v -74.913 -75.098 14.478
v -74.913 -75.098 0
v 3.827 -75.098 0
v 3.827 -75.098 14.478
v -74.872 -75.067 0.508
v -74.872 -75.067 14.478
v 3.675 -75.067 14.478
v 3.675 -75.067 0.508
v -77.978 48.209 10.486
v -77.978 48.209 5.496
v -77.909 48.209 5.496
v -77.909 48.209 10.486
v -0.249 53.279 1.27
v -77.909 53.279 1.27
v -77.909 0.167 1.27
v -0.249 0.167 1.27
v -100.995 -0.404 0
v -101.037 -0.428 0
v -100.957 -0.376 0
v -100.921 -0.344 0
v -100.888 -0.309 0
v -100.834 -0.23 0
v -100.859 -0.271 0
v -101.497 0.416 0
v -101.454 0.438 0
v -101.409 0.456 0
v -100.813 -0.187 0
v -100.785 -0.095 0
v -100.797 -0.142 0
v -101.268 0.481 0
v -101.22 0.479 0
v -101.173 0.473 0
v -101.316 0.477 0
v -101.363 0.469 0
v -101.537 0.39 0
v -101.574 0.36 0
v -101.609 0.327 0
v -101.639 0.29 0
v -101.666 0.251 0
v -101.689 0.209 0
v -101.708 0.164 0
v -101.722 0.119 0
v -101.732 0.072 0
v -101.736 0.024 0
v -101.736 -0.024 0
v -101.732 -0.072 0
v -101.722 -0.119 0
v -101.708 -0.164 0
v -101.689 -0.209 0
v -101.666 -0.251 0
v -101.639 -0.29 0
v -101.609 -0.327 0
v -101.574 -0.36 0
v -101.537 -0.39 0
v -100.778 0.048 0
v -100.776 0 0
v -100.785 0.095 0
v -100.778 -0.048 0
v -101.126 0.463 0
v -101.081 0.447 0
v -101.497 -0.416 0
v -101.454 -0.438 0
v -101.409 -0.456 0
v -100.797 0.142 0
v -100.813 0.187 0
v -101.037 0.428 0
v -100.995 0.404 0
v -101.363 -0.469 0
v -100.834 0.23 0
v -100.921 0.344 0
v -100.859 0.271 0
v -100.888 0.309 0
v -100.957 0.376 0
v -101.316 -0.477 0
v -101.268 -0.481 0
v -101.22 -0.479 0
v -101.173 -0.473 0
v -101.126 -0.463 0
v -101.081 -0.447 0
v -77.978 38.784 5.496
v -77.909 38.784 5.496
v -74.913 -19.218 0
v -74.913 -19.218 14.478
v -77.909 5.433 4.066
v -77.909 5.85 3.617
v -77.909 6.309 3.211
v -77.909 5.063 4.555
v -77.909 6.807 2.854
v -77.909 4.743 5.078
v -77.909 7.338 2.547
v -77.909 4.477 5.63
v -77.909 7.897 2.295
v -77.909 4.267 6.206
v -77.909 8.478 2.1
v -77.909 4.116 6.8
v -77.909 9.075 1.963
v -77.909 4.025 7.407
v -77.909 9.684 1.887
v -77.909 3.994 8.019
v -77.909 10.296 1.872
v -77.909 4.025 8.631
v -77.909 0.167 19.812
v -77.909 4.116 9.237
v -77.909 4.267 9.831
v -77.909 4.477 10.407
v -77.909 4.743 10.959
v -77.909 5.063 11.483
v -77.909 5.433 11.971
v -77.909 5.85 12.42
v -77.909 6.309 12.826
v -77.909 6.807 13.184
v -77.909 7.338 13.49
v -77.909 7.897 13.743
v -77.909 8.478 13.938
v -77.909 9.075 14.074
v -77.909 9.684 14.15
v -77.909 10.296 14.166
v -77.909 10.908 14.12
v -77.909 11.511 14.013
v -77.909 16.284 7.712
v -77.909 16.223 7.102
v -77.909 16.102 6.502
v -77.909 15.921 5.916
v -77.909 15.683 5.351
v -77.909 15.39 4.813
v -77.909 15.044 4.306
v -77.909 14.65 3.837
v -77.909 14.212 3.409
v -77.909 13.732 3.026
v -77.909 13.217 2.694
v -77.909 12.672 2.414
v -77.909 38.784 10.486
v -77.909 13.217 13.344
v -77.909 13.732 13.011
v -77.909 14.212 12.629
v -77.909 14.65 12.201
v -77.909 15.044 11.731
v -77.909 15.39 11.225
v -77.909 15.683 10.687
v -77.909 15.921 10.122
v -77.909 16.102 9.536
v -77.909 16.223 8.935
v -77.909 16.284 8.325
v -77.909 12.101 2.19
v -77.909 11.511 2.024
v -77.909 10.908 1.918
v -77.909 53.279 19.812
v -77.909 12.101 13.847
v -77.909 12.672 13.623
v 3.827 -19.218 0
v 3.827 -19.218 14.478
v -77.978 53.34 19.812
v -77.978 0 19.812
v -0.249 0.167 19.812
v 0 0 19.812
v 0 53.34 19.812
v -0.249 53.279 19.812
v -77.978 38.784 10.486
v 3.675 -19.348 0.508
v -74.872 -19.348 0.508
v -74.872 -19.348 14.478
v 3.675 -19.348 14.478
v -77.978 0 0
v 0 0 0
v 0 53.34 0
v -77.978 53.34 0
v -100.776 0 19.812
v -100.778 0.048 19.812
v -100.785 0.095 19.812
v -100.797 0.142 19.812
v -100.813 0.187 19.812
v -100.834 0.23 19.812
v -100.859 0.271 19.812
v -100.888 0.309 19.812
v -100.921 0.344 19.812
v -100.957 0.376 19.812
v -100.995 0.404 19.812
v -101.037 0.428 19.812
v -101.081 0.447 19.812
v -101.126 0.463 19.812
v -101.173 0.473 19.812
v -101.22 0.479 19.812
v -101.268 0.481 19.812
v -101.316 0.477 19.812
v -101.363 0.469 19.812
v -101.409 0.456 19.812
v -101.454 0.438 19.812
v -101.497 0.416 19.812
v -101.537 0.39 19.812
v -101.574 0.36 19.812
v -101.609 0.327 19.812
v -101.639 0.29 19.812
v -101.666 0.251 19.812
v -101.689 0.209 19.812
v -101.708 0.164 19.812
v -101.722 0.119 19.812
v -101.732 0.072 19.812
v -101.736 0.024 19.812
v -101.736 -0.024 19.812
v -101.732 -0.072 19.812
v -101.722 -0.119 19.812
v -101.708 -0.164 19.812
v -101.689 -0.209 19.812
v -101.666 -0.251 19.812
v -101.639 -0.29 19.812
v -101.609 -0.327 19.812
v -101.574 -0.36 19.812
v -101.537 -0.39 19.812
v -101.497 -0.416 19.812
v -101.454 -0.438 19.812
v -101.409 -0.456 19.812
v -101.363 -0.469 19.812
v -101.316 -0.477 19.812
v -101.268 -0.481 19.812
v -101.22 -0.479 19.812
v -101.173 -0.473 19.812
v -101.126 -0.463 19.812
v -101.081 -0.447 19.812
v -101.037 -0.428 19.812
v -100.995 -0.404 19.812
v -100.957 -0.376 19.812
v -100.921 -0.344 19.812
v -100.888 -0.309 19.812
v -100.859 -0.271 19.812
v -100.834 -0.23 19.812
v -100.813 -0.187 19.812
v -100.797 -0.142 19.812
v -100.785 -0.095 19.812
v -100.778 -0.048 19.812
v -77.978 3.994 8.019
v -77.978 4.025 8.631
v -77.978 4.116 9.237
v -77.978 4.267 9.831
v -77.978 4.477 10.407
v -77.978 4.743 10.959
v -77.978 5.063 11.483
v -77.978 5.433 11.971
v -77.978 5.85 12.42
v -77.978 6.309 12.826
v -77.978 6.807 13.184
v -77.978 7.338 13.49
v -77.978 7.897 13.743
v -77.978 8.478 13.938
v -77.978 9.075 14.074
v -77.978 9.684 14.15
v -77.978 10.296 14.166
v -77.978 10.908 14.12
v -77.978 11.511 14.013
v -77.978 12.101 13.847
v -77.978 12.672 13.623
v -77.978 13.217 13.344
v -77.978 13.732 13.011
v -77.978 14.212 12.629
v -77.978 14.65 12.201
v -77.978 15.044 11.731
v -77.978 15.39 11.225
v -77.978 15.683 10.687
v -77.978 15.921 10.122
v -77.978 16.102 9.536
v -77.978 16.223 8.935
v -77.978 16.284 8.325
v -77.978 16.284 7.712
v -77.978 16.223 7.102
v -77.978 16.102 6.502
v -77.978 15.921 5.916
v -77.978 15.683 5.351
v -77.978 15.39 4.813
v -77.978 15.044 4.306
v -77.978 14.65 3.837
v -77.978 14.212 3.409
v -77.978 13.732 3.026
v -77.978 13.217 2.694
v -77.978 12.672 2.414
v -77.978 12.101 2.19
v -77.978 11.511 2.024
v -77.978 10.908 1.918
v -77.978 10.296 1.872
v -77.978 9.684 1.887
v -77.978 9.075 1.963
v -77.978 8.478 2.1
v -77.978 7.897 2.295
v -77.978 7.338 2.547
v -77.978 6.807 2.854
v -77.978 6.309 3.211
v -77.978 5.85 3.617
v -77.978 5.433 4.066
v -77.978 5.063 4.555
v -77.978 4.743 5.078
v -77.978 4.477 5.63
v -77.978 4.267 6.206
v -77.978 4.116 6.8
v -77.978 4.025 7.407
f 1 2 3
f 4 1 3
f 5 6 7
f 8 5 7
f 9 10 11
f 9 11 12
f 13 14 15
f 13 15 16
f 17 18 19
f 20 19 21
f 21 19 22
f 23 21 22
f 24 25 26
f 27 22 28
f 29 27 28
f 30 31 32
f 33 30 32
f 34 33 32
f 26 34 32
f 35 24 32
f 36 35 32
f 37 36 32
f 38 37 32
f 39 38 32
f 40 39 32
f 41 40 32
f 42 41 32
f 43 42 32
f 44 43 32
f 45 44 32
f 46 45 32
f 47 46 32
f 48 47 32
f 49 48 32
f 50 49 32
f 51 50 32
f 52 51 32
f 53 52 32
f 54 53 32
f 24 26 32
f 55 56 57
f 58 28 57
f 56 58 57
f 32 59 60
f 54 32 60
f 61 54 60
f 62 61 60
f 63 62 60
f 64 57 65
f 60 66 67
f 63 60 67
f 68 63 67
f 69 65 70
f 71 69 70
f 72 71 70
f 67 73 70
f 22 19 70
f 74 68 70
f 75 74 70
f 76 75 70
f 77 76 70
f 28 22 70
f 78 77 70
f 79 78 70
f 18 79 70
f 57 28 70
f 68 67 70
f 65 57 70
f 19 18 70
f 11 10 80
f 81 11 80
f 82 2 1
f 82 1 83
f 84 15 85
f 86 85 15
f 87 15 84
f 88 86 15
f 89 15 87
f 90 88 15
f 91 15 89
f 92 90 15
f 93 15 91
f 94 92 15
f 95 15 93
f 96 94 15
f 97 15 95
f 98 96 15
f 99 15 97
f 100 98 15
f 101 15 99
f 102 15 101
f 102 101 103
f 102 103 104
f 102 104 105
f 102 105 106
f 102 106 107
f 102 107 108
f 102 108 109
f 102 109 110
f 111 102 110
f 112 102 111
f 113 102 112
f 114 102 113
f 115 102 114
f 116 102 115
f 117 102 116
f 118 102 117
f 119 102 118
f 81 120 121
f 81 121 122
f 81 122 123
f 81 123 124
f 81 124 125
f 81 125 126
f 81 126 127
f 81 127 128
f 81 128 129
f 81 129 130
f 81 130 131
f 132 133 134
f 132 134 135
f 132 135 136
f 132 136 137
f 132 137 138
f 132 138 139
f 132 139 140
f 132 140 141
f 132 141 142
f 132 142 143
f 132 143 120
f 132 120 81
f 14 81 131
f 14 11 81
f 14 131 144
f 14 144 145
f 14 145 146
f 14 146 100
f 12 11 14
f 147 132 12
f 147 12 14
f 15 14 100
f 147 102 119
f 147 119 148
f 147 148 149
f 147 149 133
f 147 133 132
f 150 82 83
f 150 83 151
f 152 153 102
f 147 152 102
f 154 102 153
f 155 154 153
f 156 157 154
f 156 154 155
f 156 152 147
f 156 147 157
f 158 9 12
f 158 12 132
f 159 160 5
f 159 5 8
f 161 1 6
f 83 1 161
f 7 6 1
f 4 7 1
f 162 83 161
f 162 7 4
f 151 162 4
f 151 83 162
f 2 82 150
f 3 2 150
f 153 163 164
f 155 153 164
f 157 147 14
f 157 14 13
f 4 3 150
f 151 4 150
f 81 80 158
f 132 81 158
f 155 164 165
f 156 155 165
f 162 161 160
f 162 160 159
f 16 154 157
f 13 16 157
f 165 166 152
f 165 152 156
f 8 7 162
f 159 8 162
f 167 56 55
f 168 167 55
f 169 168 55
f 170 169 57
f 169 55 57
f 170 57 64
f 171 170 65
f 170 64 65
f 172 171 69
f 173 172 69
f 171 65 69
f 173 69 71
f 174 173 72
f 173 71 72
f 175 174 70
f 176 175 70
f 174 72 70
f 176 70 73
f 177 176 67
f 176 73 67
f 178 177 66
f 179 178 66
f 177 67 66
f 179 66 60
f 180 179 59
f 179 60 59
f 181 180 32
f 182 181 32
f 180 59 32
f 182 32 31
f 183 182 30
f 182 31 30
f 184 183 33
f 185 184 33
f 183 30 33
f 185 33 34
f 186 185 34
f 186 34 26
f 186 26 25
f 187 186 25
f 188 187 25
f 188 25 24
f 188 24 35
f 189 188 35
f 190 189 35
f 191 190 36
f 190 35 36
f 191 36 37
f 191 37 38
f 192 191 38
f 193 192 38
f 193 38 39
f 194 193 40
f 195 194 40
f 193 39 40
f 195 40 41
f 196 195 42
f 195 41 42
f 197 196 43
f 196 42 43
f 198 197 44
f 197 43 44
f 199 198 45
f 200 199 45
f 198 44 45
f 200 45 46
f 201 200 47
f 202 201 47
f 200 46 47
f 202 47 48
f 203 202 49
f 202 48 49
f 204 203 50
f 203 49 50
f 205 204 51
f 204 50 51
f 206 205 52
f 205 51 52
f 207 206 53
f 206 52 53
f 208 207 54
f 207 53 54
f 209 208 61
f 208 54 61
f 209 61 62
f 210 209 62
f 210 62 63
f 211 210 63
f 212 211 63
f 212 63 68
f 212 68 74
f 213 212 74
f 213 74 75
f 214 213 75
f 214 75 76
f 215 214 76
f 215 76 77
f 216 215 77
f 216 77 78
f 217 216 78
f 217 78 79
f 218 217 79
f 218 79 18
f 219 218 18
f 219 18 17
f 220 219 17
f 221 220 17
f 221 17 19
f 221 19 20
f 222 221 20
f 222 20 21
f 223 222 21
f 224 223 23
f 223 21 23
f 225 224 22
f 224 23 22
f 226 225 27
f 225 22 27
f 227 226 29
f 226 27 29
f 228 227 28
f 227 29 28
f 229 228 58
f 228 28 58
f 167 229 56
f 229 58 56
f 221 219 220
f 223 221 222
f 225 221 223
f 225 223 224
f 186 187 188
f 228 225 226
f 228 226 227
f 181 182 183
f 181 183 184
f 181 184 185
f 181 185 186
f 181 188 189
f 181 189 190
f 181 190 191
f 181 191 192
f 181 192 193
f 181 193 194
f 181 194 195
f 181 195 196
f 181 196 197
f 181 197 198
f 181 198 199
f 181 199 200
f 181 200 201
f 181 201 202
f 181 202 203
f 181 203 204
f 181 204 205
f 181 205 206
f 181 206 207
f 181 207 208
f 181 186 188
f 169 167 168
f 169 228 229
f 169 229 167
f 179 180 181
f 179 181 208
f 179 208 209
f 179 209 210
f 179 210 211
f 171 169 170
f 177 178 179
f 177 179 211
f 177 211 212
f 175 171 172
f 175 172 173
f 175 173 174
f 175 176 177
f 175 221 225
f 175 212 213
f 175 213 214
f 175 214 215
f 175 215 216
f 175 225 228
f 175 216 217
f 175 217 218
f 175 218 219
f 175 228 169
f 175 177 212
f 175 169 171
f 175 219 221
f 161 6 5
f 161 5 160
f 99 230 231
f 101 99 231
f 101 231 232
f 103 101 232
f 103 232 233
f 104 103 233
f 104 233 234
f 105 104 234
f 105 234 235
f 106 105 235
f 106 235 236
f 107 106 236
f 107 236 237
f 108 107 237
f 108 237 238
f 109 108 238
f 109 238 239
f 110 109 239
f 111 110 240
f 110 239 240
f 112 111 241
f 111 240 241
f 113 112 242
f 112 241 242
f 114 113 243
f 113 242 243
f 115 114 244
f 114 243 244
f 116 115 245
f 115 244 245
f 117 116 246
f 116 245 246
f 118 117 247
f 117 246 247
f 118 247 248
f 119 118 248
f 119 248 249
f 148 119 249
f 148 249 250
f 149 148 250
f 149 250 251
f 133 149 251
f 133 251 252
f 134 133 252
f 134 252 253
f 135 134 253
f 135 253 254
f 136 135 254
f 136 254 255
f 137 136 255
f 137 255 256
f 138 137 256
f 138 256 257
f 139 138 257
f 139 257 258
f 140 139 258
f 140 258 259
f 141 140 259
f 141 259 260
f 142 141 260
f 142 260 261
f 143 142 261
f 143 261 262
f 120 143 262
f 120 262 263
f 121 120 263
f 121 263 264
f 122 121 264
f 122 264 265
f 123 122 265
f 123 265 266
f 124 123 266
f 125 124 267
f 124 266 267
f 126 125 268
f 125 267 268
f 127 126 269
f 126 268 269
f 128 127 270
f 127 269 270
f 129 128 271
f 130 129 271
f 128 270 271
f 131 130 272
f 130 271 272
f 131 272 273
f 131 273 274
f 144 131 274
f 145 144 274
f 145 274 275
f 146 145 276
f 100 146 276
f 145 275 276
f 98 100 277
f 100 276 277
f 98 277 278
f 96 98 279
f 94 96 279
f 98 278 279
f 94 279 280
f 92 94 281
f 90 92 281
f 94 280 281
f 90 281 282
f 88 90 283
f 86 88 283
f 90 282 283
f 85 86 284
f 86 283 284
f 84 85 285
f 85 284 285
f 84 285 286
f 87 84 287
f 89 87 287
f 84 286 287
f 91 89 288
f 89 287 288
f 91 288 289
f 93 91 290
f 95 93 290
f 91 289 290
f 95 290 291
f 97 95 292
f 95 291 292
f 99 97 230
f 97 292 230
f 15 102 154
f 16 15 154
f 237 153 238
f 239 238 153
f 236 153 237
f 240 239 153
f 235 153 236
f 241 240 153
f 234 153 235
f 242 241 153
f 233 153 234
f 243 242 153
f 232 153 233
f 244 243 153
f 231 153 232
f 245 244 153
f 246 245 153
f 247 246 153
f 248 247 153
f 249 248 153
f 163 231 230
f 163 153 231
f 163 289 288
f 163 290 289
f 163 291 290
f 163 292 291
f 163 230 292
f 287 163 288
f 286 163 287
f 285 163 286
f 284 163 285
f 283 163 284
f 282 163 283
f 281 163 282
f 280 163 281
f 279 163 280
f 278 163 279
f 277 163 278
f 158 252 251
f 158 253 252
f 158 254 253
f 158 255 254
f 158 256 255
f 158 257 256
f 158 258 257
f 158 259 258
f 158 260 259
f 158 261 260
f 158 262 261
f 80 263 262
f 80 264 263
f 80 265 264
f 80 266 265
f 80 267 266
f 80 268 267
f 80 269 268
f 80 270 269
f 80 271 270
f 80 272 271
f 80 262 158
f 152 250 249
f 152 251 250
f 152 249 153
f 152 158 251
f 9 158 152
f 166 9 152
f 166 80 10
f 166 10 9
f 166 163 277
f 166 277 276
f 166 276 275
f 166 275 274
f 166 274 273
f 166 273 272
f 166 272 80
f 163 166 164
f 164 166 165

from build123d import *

# Parameters (mm, degrees)
F0_R      = 0.480721
F0_W      = 77.978
F0_H      = 53.34
F1_DEPTH  = 19.812
F2_R      = 6.148784
F3_DEPTH  = 25.4
F4_W      = 77.660104
F4_H      = 53.111837
F5_DEPTH  = 18.542
F6_W      = 9.424716
F6_H      = 4.989866
F7_DEPTH  = 25.4
F8_W      = 78.74
F8_H      = 55.88
F9_DEPTH  = 14.478
F10_W     = 78.546543
F10_H     = 55.719186
F11_DEPTH = 13.97


with BuildPart() as f1:
    # F0 (on Top) → F1 (new body)
    with BuildSketch(Plane.XY):
        with Locations((-101.256253, 0)):
            Circle(F0_R)
        with Locations((-38.989, 26.67)):
            Rectangle(F0_W, F0_H)
    extrude(amount=F1_DEPTH)

    # F2 (on face) → F3 (cut)
    with BuildSketch(Plane(origin=(-77.978, 0, 0), x_dir=(0, -1, 0), z_dir=(-1, 0, 0))):
        with Locations((-10.143096, 8.018783)):
            Circle(F2_R)
    extrude(amount=-F3_DEPTH, mode=Mode.SUBTRACT)

    # F4 (on face) → F5 (cut)
    with BuildSketch(Plane.XY.offset(19.812)):
        with Locations((-39.079075, 26.722836)):
            Rectangle(F4_W, F4_H)
    extrude(amount=-F5_DEPTH, mode=Mode.SUBTRACT)

    # F6 (on face) → F7 (cut)
    with BuildSketch(Plane(origin=(-77.978, 0, 0), x_dir=(0, -1, 0), z_dir=(-1, 0, 0))):
        with Locations((-43.496434, 7.990607)):
            Rectangle(F6_W, F6_H)
    extrude(amount=-F7_DEPTH, mode=Mode.SUBTRACT)


with BuildPart() as f9:
    # F8 (on Top) → F9 (new body)
    with BuildSketch(Plane.XY):
        with Locations((-35.543442, -47.15838)):
            Rectangle(F8_W, F8_H)
    extrude(amount=F9_DEPTH)

    # F10 (on face) → F11 (cut)
    with BuildSketch(Plane.XY.offset(14.478)):
        with Locations((-35.598492, -47.207823)):
            Rectangle(F10_W, F10_H)
    extrude(amount=-F11_DEPTH, mode=Mode.SUBTRACT)


solid = Compound([f1.part, f9.part])
